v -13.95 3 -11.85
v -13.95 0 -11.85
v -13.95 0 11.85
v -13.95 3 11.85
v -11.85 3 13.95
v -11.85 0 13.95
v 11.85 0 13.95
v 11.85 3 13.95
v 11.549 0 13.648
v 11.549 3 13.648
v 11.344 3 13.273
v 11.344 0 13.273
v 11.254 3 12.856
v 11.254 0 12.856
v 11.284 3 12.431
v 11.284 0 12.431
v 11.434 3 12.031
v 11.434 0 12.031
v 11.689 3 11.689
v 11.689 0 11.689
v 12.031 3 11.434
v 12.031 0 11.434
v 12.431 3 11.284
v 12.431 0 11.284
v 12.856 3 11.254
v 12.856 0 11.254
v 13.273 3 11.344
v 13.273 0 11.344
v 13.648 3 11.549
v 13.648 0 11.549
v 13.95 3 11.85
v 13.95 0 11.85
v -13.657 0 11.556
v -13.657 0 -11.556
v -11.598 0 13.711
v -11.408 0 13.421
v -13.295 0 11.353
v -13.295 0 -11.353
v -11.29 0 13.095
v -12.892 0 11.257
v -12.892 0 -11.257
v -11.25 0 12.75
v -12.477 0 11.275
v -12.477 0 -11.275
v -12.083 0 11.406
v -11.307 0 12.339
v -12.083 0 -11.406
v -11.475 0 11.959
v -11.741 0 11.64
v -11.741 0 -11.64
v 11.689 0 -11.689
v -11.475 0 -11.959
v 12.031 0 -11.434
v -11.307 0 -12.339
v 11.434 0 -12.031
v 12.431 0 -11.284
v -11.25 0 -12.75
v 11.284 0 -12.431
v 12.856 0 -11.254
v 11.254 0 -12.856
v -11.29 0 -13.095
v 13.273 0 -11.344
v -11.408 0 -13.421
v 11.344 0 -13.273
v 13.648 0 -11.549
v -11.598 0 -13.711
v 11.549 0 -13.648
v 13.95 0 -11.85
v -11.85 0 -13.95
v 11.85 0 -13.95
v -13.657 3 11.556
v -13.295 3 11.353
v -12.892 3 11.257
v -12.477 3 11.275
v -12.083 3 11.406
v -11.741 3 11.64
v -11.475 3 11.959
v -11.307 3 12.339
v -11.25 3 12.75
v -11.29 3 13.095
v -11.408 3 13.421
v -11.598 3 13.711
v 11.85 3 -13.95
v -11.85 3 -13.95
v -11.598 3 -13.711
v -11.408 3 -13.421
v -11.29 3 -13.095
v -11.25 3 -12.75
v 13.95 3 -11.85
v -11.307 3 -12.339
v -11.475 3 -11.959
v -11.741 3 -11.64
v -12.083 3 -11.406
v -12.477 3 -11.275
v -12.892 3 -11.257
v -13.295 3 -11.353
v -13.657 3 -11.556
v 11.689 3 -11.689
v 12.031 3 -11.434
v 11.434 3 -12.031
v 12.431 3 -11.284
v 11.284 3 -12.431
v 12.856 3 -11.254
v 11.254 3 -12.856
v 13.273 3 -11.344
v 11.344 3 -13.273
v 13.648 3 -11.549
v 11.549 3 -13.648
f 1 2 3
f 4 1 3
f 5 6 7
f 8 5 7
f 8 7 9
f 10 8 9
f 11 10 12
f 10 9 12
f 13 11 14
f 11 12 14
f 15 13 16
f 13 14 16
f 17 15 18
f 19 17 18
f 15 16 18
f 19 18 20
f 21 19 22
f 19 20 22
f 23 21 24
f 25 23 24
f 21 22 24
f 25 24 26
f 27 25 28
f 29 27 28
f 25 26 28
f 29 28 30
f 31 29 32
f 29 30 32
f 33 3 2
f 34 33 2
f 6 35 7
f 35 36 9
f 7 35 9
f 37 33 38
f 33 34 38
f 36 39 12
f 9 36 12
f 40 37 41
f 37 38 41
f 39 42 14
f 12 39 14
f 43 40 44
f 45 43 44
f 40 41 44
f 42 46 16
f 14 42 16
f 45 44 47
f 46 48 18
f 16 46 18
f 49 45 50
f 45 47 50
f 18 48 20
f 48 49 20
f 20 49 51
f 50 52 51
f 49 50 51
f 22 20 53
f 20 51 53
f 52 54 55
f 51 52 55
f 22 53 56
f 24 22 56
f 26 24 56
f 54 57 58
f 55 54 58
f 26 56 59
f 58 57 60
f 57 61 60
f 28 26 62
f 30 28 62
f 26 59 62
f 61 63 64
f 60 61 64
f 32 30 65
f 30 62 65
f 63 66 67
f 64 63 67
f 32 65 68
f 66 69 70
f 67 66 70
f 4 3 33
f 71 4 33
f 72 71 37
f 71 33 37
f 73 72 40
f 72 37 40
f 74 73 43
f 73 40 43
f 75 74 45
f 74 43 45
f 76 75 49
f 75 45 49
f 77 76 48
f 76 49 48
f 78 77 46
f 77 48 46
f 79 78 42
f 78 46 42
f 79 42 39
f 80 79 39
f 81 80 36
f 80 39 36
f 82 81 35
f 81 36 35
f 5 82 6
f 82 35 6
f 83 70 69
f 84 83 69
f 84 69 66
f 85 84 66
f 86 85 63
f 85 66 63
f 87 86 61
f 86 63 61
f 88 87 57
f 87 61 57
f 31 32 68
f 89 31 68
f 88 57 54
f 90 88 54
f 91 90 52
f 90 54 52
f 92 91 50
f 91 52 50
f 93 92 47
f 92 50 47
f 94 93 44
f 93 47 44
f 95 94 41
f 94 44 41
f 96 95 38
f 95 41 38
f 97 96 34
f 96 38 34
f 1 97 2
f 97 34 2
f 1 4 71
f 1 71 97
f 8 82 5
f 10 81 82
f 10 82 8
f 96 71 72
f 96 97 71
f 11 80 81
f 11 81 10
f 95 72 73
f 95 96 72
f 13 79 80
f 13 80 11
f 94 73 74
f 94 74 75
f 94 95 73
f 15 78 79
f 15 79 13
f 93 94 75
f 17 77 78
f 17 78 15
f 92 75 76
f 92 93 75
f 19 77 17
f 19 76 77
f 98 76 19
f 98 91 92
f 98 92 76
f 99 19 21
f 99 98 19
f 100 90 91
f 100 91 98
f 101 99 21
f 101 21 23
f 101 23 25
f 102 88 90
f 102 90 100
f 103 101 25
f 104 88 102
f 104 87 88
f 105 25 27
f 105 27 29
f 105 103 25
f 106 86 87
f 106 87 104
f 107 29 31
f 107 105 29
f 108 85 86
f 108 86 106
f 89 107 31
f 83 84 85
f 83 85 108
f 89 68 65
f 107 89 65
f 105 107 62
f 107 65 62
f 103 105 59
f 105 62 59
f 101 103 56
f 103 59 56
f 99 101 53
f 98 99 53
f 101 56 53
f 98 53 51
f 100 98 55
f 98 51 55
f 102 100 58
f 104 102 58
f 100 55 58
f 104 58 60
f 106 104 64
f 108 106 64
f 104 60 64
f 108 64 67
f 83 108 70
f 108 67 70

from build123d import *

# Parameters (mm, degrees)
FLIGHT_COMPUTER_DEPTH = 3


with BuildPart() as part:
    # Sketch2 → Flight Computer (new body)
    with BuildSketch(Plane(origin=(0, 0, 0), x_dir=(1, 0, 0), z_dir=(0, 1, 0))):
        with BuildLine():
            ThreePointArc((-11.25, 12.75), (-12.275658351, 11.326975053), (-13.95, 11.85))
            Line((-13.95, 11.85), (-13.95, -11.85))
            ThreePointArc((-13.95, -11.85), (-12.275658351, -11.326975053), (-11.25, -12.75))
            ThreePointArc((-11.25, -12.75), (-11.408359213, -13.420820393), (-11.85, -13.95))
            Line((-11.85, -13.95), (11.85, -13.95))
            ThreePointArc((11.85, -13.95), (11.689339828, -11.689339828), (13.95, -11.85))
            Line((13.95, -11.85), (13.95, 11.85))
            ThreePointArc((13.95, 11.85), (11.689339828, 11.689339828), (11.85, 13.95))
            Line((11.85, 13.95), (-11.85, 13.95))
            ThreePointArc((-11.85, 13.95), (-11.408359214, 13.420820393), (-11.25, 12.75))
        make_face()
    extrude(amount=FLIGHT_COMPUTER_DEPTH)


solid = part.part
